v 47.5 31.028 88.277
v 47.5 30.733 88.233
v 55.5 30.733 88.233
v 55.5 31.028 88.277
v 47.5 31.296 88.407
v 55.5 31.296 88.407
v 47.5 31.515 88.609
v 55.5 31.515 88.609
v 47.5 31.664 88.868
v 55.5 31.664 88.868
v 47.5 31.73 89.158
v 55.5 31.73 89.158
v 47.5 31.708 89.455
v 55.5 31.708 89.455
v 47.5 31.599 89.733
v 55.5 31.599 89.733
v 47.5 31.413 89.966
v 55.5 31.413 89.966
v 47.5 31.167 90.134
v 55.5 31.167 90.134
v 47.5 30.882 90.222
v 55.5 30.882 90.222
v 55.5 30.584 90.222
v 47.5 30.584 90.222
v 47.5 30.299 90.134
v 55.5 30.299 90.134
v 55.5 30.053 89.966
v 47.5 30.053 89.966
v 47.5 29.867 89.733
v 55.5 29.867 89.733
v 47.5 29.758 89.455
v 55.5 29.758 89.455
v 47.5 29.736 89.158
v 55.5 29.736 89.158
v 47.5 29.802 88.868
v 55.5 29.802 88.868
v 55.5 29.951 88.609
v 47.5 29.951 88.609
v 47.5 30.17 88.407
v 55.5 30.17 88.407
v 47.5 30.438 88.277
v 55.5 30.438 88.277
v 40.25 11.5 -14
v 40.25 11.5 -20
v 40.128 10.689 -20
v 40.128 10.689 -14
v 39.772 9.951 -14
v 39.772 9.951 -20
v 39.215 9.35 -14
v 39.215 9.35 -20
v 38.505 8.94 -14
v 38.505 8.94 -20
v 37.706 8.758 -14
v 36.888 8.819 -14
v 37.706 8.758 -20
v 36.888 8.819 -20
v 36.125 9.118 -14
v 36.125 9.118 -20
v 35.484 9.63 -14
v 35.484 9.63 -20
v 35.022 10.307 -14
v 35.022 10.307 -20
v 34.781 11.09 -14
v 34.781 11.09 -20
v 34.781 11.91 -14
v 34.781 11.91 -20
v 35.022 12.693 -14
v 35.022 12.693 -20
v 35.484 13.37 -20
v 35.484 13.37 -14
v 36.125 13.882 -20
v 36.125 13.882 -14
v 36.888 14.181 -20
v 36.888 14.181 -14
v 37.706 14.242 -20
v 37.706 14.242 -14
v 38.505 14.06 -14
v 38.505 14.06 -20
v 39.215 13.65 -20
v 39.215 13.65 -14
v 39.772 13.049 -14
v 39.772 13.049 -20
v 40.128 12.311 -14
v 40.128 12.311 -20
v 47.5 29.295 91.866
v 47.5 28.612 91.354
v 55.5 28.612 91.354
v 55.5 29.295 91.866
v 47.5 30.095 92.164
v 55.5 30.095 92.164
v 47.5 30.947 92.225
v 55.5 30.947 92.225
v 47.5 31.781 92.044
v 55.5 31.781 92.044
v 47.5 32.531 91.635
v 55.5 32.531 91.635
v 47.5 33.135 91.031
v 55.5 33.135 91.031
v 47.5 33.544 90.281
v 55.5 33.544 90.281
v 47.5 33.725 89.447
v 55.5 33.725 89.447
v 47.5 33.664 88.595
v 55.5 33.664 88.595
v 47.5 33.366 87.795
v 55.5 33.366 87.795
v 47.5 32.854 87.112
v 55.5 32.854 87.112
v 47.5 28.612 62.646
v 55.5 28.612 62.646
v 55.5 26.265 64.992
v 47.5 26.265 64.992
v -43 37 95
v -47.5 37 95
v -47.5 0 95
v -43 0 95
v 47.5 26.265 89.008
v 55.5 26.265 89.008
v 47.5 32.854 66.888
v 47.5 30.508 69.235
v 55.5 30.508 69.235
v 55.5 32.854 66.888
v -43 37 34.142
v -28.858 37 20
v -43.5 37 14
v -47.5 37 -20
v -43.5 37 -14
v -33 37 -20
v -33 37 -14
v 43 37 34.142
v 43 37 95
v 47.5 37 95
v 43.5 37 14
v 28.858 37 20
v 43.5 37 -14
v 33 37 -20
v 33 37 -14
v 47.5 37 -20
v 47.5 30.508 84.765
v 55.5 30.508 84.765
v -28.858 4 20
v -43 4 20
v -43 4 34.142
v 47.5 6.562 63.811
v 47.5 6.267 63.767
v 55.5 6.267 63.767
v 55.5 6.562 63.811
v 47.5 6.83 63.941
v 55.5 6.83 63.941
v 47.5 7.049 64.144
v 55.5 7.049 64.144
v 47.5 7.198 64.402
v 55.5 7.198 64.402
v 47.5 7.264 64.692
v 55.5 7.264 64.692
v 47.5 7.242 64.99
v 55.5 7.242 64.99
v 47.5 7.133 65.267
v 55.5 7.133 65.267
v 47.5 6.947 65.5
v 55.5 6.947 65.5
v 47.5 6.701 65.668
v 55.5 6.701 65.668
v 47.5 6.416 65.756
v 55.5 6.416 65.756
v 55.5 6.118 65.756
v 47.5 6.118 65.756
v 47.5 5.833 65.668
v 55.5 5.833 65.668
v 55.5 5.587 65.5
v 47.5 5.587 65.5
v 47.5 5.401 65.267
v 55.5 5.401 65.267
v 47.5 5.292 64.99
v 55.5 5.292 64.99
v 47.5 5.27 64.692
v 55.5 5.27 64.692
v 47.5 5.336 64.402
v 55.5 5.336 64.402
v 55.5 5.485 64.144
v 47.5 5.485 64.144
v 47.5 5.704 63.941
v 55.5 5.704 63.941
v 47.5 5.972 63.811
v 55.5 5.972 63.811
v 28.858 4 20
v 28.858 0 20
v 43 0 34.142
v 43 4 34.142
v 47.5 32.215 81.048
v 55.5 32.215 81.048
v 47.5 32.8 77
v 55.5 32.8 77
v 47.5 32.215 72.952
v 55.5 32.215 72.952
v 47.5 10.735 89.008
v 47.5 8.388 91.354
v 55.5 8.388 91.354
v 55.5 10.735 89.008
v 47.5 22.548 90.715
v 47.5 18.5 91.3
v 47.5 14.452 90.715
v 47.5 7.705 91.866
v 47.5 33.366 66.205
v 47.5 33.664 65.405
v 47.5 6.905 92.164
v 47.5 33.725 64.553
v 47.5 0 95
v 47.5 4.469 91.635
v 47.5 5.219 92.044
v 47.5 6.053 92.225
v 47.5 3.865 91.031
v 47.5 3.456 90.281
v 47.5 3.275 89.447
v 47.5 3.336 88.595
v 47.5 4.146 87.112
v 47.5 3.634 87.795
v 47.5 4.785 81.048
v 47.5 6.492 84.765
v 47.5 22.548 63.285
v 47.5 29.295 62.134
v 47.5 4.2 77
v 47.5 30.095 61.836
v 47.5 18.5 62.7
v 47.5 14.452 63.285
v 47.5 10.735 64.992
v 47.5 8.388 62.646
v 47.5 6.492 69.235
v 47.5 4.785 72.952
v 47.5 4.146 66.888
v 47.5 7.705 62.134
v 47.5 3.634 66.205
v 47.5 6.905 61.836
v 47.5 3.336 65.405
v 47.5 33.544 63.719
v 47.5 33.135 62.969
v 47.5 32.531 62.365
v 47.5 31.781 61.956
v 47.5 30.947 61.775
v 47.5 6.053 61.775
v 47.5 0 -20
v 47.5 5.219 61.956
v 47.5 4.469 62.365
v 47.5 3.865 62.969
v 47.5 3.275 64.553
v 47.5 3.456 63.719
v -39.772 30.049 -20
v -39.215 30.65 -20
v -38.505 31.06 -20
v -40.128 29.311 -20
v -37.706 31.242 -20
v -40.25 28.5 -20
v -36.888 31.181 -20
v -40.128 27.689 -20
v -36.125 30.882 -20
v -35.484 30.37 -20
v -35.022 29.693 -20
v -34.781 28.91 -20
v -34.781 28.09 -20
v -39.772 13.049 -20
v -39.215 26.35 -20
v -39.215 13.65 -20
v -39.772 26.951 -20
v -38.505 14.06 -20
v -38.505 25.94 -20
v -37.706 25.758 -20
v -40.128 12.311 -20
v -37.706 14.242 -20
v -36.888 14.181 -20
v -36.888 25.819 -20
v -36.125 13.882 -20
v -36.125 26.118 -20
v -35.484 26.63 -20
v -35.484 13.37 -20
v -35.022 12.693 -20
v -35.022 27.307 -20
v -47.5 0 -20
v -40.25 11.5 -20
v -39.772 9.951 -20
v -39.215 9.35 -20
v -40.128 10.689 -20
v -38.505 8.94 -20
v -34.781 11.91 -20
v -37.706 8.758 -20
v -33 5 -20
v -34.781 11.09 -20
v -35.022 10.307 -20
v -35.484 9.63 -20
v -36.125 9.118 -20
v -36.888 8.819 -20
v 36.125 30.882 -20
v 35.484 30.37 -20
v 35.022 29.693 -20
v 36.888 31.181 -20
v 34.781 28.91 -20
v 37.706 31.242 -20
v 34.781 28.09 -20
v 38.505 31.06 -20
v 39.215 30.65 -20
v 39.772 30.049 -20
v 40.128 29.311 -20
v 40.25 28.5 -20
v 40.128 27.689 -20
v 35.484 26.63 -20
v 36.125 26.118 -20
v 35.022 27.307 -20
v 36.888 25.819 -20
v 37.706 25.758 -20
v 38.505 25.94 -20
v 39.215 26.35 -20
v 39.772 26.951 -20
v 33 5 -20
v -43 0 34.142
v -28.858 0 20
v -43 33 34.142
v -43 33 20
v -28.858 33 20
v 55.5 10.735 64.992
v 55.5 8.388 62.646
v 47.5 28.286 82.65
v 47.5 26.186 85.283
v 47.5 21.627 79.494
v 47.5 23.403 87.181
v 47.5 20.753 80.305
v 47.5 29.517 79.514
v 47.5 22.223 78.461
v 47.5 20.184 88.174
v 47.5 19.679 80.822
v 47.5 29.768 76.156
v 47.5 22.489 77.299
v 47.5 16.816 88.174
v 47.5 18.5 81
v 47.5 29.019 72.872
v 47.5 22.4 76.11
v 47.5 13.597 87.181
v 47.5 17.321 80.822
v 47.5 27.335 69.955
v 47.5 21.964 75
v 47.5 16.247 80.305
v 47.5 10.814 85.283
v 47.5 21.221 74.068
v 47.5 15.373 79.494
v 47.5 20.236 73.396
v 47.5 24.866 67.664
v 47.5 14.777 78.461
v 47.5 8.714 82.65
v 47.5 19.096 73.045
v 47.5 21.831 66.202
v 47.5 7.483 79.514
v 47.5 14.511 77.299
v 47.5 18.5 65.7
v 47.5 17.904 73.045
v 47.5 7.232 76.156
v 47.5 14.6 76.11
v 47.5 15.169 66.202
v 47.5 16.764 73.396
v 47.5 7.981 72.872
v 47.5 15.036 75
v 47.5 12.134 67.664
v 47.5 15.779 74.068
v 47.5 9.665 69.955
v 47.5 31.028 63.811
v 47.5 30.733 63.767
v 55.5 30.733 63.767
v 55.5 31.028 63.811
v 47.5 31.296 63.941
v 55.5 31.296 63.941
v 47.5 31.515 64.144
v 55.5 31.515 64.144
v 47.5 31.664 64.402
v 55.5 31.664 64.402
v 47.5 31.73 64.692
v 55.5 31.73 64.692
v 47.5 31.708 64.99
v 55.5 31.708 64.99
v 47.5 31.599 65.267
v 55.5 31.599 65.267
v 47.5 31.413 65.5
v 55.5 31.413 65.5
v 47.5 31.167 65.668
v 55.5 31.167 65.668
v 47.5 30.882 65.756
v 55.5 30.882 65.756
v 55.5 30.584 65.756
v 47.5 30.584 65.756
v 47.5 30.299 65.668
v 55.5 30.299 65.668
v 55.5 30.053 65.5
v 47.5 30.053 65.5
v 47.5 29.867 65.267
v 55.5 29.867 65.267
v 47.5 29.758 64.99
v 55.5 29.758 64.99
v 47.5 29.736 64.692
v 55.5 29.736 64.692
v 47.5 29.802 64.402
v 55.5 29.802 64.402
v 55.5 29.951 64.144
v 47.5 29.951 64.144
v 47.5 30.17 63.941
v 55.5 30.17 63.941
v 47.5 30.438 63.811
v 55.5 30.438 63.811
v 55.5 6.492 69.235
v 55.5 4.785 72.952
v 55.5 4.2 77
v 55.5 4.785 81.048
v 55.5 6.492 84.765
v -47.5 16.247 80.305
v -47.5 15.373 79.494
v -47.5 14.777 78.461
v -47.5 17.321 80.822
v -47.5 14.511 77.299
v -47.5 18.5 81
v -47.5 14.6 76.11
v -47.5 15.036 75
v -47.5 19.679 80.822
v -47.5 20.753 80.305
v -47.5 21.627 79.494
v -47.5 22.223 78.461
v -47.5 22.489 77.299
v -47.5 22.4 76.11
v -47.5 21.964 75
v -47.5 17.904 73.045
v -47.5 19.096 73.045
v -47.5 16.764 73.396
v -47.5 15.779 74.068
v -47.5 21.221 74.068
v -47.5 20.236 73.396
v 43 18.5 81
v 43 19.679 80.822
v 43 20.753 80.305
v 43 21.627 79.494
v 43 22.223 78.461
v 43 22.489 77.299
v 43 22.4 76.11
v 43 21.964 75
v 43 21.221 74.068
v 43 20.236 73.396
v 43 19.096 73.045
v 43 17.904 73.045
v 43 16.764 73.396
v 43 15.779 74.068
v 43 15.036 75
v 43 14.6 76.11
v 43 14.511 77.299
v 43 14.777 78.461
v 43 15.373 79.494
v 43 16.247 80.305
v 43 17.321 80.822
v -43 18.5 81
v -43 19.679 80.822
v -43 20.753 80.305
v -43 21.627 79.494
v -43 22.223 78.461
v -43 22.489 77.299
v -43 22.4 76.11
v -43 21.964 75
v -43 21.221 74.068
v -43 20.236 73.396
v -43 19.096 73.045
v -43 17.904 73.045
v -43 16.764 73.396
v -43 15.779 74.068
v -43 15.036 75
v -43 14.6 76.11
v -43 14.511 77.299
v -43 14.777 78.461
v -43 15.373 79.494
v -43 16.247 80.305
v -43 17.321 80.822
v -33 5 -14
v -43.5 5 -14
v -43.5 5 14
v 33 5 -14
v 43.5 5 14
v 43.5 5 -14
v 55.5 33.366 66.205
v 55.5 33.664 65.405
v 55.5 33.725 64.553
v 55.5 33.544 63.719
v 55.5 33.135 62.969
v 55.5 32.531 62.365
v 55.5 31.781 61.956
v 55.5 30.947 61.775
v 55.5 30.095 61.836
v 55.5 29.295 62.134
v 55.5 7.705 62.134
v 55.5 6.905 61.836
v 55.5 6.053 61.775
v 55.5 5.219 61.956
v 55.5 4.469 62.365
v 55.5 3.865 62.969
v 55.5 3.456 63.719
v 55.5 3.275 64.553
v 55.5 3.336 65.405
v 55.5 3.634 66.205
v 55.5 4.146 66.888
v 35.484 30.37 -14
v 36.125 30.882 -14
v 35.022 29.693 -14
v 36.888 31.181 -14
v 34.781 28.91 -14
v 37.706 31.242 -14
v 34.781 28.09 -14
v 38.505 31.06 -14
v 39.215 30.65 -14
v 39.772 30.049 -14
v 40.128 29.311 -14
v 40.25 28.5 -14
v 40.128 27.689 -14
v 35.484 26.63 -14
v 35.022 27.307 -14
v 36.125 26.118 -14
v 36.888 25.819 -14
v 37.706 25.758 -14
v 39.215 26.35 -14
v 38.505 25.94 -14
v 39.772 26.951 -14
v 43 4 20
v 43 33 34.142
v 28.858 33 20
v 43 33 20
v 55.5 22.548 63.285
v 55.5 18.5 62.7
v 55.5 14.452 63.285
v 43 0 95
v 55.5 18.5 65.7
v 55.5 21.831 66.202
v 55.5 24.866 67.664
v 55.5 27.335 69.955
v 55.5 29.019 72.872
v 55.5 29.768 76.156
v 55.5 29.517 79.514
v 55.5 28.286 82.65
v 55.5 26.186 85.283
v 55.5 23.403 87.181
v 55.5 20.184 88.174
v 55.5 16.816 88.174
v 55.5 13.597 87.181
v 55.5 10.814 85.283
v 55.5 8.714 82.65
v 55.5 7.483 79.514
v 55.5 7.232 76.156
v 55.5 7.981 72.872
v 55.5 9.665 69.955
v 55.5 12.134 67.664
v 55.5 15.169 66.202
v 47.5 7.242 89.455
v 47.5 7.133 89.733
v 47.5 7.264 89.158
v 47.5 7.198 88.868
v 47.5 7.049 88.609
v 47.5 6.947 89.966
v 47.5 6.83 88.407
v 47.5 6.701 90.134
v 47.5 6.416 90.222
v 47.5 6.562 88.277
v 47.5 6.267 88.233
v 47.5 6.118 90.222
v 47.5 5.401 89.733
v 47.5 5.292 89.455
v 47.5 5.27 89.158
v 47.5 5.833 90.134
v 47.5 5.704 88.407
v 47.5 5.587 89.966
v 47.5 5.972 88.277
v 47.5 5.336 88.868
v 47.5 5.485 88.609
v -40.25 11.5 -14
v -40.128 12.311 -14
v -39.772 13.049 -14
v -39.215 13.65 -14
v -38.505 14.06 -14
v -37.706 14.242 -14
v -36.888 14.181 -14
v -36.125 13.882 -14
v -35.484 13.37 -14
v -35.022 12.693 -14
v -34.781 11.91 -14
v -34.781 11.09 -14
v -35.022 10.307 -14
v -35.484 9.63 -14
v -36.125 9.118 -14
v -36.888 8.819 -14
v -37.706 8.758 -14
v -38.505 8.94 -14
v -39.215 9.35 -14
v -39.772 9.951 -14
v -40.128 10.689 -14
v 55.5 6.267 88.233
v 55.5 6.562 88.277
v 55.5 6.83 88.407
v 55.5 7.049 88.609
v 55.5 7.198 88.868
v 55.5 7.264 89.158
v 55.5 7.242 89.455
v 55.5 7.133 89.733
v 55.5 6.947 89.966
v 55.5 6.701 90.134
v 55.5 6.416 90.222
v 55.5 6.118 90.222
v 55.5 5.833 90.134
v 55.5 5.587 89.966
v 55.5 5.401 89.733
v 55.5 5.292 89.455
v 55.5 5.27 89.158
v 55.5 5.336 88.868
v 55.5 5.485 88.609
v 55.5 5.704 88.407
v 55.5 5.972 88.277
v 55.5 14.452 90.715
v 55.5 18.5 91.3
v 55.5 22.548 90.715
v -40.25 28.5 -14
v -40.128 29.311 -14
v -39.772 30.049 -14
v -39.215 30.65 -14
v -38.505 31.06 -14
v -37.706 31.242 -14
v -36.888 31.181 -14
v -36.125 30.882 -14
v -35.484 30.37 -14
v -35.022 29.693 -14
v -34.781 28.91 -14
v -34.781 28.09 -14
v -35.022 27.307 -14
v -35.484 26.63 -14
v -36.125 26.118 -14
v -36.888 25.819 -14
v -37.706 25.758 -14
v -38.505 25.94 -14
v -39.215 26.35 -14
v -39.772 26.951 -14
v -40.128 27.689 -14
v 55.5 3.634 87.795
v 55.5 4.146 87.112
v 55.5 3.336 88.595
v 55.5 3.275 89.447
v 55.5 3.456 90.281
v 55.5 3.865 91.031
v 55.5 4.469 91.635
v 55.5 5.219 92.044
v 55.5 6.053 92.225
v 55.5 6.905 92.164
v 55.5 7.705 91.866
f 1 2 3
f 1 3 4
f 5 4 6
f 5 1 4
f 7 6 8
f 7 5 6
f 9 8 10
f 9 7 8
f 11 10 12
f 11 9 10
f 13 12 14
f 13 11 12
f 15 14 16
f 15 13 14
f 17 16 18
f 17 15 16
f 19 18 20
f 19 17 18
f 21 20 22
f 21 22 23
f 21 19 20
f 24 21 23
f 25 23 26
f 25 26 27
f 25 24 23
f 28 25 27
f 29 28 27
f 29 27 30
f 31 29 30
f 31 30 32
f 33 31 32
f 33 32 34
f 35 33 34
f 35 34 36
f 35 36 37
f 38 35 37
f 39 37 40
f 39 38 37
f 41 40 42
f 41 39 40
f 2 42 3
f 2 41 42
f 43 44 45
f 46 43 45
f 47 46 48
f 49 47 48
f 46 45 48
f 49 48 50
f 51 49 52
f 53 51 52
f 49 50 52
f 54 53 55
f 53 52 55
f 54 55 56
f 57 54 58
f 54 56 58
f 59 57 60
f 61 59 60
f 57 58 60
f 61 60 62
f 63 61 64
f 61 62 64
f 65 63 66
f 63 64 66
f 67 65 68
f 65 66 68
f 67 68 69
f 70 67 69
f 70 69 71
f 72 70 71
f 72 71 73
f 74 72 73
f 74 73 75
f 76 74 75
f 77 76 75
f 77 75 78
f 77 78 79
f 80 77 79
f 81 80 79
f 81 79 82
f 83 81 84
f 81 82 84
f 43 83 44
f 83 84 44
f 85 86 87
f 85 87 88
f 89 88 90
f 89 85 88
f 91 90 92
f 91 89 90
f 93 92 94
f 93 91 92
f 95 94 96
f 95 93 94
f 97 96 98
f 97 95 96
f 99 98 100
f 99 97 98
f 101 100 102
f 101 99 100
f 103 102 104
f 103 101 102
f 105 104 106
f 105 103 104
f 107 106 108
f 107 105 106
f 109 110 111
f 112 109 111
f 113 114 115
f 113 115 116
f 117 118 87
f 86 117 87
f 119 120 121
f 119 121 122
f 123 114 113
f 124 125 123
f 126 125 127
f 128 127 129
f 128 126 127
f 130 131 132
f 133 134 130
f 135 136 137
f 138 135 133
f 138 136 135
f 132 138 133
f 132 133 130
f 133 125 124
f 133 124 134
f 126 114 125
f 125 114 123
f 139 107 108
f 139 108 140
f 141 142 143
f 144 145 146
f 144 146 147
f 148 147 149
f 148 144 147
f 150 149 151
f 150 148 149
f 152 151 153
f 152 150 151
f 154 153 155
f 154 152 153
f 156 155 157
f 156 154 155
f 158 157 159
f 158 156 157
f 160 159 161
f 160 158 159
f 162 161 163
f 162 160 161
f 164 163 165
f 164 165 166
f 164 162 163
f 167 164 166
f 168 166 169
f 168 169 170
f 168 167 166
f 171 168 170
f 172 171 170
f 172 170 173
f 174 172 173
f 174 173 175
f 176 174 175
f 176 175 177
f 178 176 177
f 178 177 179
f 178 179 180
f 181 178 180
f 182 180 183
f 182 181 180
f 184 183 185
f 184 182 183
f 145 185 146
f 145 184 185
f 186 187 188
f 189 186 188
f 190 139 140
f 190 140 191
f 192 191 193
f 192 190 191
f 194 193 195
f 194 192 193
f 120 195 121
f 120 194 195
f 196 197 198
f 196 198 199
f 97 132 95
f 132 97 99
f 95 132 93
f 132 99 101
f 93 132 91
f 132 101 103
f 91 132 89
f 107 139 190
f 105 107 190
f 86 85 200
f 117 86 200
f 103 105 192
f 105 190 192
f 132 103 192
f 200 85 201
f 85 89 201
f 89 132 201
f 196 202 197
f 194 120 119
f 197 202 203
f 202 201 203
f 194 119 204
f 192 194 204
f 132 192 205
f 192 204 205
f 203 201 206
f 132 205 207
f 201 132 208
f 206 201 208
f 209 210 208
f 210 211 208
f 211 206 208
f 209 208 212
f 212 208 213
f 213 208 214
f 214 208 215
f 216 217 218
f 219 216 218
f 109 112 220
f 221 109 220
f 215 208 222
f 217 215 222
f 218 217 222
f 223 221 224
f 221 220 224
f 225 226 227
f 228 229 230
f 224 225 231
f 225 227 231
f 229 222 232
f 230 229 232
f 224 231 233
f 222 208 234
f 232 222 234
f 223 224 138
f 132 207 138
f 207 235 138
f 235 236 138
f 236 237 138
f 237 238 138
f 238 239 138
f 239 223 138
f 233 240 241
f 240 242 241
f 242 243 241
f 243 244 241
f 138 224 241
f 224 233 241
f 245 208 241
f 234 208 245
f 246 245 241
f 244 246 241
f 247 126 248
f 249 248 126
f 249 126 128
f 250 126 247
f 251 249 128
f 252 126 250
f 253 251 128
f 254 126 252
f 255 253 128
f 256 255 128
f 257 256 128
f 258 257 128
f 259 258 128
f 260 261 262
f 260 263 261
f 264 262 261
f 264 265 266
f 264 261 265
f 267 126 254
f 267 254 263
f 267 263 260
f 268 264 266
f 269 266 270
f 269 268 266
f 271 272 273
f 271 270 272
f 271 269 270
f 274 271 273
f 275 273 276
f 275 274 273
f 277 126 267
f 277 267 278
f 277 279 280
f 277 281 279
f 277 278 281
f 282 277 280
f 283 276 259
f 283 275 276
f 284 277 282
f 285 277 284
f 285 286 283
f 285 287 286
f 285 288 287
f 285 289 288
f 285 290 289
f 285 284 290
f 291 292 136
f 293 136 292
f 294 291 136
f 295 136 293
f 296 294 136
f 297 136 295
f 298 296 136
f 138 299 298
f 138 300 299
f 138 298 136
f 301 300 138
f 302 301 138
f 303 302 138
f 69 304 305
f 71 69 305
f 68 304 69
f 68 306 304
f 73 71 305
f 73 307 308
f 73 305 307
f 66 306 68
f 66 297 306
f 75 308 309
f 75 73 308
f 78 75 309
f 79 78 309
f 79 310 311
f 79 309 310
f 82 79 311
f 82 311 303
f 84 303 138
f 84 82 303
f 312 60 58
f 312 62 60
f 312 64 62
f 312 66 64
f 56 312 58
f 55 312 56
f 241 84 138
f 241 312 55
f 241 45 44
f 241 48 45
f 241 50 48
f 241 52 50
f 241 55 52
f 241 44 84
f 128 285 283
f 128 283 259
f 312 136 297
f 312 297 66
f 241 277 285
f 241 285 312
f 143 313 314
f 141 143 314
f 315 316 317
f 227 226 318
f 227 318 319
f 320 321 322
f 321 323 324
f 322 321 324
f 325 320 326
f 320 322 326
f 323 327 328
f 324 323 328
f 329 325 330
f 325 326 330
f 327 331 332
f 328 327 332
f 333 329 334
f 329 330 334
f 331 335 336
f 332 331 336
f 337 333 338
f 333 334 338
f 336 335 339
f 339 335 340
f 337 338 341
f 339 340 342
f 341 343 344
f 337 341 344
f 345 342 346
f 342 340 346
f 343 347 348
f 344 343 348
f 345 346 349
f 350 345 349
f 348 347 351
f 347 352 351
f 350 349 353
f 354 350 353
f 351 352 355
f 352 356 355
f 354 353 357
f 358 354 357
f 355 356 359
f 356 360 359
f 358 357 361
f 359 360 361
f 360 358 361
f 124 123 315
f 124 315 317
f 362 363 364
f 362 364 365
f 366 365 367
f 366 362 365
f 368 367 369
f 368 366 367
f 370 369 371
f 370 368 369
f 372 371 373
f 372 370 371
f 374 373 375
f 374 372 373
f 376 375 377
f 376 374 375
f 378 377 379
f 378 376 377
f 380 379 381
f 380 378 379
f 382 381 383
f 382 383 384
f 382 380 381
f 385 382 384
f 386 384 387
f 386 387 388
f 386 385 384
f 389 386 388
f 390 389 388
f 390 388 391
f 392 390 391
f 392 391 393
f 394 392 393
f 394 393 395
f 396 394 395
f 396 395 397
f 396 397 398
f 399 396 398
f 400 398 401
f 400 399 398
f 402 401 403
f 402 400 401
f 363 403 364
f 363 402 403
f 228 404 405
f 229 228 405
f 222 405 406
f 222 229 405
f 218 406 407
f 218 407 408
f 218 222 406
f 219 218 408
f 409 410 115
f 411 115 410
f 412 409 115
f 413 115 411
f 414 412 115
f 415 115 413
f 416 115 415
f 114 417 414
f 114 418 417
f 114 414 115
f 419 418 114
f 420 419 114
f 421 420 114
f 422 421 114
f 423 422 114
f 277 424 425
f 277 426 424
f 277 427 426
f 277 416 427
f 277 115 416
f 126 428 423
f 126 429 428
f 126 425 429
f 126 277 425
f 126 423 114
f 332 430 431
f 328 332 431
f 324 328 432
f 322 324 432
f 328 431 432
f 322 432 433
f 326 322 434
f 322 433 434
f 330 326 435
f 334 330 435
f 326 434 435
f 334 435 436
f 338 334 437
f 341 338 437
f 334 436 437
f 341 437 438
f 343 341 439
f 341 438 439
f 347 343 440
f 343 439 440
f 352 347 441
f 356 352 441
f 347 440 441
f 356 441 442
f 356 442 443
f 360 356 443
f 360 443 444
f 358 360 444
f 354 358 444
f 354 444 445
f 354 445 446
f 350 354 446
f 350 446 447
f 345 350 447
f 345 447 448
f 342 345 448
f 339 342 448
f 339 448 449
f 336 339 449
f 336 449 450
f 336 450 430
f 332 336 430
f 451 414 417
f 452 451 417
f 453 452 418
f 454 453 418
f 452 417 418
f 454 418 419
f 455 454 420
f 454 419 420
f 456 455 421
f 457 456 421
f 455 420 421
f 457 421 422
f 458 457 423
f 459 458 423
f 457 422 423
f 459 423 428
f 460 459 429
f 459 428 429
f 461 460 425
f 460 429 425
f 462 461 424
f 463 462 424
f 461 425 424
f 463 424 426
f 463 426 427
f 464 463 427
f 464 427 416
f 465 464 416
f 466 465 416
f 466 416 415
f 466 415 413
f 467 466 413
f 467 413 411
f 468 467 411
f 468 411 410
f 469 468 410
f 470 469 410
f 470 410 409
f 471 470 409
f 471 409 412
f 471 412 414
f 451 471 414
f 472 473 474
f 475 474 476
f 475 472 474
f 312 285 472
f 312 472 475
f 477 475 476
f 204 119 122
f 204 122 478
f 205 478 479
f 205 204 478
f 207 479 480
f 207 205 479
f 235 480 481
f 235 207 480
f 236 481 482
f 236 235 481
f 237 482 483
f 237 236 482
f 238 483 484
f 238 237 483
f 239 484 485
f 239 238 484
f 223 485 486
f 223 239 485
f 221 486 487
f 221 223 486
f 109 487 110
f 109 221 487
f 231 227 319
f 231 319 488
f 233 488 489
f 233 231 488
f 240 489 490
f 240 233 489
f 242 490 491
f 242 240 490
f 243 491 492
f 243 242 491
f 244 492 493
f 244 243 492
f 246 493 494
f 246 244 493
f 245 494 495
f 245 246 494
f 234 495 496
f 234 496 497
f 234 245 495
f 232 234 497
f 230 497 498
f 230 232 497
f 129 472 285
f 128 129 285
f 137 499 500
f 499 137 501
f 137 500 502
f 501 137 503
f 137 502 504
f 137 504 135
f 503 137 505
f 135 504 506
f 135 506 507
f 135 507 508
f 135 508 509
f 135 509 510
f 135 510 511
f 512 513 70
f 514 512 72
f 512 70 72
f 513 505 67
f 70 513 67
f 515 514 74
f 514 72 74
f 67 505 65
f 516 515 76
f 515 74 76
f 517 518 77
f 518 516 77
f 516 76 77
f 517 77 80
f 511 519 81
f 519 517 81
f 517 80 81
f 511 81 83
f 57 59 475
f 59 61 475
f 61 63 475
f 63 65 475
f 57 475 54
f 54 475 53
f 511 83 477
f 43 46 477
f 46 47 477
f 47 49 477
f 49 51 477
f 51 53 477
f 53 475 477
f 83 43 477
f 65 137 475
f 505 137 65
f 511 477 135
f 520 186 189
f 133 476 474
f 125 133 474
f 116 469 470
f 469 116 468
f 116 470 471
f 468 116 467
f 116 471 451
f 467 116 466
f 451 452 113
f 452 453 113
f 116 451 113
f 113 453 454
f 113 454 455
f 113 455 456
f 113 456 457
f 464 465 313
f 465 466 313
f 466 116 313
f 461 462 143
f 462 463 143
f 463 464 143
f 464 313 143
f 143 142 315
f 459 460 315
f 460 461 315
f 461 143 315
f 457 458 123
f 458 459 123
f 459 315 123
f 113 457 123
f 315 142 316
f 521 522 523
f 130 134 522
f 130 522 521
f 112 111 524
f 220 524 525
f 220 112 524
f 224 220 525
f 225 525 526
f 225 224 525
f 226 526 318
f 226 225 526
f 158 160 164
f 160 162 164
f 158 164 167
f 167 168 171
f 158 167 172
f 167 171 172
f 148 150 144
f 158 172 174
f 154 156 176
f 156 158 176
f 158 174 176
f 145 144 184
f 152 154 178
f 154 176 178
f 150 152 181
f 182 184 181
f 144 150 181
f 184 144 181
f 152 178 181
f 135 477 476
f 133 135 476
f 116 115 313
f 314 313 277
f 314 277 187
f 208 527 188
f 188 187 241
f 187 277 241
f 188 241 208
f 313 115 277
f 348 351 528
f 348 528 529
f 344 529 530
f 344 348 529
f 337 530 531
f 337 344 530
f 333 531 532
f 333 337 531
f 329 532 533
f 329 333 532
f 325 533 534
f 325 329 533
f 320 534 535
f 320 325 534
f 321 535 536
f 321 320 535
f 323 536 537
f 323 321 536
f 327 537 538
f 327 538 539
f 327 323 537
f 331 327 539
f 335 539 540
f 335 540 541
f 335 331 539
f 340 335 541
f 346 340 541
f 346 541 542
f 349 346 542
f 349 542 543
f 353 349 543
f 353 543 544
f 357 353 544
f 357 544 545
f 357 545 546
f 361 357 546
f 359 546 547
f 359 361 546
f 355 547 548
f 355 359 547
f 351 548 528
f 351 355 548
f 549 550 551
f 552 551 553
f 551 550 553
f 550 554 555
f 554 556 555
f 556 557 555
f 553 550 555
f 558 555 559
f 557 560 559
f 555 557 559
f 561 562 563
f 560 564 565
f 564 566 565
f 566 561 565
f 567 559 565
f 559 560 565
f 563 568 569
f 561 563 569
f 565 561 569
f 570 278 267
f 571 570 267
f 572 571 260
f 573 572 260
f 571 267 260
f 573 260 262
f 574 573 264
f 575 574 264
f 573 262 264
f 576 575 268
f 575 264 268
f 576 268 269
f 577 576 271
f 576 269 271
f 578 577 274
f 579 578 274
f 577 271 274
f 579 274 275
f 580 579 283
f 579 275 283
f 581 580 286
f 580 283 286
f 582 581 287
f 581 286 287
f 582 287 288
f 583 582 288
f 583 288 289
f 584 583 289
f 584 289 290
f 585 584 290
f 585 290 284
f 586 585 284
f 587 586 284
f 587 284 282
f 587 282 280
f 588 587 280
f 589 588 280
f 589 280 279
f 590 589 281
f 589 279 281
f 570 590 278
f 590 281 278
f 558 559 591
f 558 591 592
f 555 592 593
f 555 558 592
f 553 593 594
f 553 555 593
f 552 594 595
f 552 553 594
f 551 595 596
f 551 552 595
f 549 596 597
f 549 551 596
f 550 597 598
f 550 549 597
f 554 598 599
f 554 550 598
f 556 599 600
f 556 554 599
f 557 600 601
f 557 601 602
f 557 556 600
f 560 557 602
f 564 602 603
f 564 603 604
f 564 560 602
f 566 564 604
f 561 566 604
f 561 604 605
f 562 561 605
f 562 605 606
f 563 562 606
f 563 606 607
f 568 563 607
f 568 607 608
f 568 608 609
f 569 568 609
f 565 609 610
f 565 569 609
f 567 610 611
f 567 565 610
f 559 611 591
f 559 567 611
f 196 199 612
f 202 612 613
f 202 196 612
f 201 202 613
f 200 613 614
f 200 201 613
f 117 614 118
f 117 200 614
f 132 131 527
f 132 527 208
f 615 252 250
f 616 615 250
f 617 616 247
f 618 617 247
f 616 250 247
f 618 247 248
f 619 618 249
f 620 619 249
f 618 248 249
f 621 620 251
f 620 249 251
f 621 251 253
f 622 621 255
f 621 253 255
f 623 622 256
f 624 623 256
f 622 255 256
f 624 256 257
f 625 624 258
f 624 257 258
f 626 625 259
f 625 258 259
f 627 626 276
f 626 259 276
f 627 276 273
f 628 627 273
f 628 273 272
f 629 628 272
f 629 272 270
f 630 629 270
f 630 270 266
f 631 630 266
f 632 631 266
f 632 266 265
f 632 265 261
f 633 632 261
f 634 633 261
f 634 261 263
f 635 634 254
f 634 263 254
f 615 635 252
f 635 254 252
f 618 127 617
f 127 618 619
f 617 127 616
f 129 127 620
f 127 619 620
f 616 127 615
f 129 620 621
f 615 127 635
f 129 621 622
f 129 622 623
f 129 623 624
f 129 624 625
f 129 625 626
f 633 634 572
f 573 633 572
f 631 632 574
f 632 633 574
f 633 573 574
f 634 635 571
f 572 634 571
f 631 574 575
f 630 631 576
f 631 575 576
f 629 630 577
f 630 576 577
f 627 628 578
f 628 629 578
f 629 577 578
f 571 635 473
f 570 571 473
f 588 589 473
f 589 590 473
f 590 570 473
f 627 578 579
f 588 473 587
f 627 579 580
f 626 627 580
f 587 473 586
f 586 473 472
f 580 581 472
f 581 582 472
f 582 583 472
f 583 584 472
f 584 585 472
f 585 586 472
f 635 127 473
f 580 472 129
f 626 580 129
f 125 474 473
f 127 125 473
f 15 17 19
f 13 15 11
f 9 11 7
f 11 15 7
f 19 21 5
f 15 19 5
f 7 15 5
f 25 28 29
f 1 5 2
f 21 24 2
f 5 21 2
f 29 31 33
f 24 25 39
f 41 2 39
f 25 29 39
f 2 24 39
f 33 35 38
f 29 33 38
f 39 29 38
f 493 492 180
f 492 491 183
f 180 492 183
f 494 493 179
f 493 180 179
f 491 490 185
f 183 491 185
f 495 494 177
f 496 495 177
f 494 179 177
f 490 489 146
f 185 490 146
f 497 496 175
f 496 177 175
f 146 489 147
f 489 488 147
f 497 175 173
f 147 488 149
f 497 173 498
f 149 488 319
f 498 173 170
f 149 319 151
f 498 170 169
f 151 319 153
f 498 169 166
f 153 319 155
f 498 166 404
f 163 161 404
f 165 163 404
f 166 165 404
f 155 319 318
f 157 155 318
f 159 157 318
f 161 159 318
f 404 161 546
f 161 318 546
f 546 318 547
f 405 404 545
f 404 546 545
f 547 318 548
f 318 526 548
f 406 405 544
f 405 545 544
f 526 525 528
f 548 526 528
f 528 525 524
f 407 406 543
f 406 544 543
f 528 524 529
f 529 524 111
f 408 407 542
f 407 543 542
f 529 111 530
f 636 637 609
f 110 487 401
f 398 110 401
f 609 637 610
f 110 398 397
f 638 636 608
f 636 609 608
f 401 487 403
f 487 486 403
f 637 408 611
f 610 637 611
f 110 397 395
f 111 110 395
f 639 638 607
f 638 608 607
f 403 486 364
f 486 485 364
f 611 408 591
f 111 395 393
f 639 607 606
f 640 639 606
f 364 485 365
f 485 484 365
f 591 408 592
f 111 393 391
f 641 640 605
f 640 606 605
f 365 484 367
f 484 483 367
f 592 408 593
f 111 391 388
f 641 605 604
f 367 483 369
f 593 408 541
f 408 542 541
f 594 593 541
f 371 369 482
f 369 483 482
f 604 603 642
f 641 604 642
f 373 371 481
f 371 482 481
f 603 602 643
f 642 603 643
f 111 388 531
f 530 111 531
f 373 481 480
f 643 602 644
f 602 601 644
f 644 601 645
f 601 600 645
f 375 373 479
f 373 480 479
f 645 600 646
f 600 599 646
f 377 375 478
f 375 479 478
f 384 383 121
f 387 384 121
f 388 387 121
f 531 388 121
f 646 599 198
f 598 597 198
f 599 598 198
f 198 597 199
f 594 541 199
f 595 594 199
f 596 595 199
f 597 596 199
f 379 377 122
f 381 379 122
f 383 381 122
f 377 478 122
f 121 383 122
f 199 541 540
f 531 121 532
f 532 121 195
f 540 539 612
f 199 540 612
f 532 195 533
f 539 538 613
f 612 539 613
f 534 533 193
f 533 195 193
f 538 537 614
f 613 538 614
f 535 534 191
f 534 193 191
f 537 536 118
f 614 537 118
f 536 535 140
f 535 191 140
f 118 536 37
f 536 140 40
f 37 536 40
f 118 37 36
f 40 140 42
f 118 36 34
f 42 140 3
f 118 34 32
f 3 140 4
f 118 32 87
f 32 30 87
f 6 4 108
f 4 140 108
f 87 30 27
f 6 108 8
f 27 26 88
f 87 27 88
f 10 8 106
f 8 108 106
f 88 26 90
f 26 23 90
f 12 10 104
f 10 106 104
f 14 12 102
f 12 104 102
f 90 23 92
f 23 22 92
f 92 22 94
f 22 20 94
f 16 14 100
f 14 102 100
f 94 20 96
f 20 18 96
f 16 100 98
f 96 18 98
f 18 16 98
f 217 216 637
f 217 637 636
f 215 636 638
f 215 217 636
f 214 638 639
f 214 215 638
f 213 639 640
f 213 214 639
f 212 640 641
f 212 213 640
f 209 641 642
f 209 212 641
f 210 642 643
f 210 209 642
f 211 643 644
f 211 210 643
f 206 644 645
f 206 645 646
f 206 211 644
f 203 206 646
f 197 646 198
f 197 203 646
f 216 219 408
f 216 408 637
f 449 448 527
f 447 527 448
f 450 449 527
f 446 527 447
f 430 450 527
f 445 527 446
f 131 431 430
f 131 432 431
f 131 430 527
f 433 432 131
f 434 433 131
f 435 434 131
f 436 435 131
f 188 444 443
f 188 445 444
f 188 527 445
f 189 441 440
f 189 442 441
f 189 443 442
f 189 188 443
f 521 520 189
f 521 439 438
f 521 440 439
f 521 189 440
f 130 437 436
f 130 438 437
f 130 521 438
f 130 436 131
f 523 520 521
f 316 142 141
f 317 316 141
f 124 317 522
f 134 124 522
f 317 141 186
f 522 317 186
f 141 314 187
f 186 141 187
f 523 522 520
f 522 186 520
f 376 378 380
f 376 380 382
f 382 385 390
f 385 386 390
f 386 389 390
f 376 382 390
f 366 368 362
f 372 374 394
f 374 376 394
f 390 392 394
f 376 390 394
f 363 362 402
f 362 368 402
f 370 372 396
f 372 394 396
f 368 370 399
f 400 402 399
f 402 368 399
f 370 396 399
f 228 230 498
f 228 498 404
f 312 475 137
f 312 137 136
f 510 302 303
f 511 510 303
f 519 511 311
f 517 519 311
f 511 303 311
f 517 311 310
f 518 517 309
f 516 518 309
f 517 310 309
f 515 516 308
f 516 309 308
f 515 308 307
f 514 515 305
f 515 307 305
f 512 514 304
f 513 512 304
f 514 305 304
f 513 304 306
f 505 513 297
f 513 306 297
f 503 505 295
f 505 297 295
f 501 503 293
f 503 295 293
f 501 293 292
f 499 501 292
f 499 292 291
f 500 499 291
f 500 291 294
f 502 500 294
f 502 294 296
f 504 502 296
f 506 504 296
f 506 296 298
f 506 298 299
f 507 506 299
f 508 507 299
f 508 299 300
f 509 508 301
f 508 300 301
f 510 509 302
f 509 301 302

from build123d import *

# Parameters (mm, degrees)
SKETCH1_W            = 95
SKETCH1_H            = 40
BOSS_EXTRUDE1_DEPTH  = 5
SKETCH2_W            = 14.5
SKETCH2_H            = 6
BOSS_EXTRUDE2_DEPTH  = 32
SKETCH4_R            = 2.75
CUT_EXTRUDE1_DEPTH   = 6
BOSS_EXTRUDE5_DEPTH  = 32
SKETCH11_W           = 4.5
SKETCH11_H           = 37
BOSS_EXTRUDE6_DEPTH  = 75
SKETCH12_R           = 4
CUT_EXTRUDE3_DEPTH   = 110
BOSS_EXTRUDE9_DEPTH  = 4
SKETCH16_R           = 11.3
SKETCH16_R_2         = 1
BOSS_EXTRUDE11_DEPTH = 8


with BuildPart() as part:
    # Sketch1 → Boss-Extrude1 (new body)
    with BuildSketch(Plane(origin=(0, 0, 0), x_dir=(1, 0, 0), z_dir=(0, 1, 0))):
        Rectangle(SKETCH1_W, SKETCH1_H)
    extrude(amount=BOSS_EXTRUDE1_DEPTH)

    # Sketch2 → Boss-Extrude2 (add)
    with BuildSketch(Plane(origin=(0, 5, 0), x_dir=(1, 0, 0), z_dir=(0, 1, 0))):
        with Locations((-40.25, 17)):
            Rectangle(SKETCH2_W, SKETCH2_H)
        with Locations((40.25, 17)):
            Rectangle(SKETCH2_W, SKETCH2_H)
    extrude(amount=BOSS_EXTRUDE2_DEPTH)

    # Sketch4 → Cut-Extrude1 (cut)
    with BuildSketch(Plane(origin=(0, 0, -20), x_dir=(-1, 0, 0), z_dir=(0, 0, -1))):
        with Locations((37.5, 11.5)):
            Circle(SKETCH4_R)
        with Locations((37.5, 28.5)):
            Circle(SKETCH4_R)
        with Locations(Location((-37.5, 28.5, 0), (0, 0, 180))):
            Circle(SKETCH4_R)
        with Locations(Location((-37.5, 11.5, 0), (0, 0, 180))):
            Circle(SKETCH4_R)
    extrude(amount=-CUT_EXTRUDE1_DEPTH, mode=Mode.SUBTRACT)

    # Sketch10 → Boss-Extrude5 (add)
    with BuildSketch(Plane(origin=(0, 5, 0), x_dir=(1, 0, 0), z_dir=(0, 1, 0))):
        Polygon((-47.5, -14), (-47.5, -20), (-43.5, -20), (43.5, -20), (47.5, -20), (47.5, -19), (47.5, 14), (43.5, 14), (43.5, -14), (-43.5, -14), (-43.5, 14), (-47.5, 14), align=None)
    extrude(amount=BOSS_EXTRUDE5_DEPTH)

    # Sketch11 → Boss-Extrude6 (add)
    with BuildSketch(Plane.XY.offset(20)):
        with Locations((-45.25, 18.5)):
            Rectangle(SKETCH11_W, SKETCH11_H)
        with Locations((45.25, 18.5)):
            Rectangle(SKETCH11_W, SKETCH11_H)
    extrude(amount=BOSS_EXTRUDE6_DEPTH)

    # Sketch12 → Cut-Extrude3 (cut)
    with BuildSketch(Plane.ZY.offset(47.5)):
        with Locations((77, 18.5)):
            Circle(SKETCH12_R)
    extrude(amount=-CUT_EXTRUDE3_DEPTH, mode=Mode.SUBTRACT)

    # Sketch15 → Boss-Extrude9 (add)
    with BuildSketch(Plane(origin=(0, 37, 0), x_dir=(1, 0, 0), z_dir=(0, 1, 0))):
        Polygon((28.857864376, -20), (43, -34.142135624), (43, -20), align=None)
        Polygon((-28.857864376, -20), (-43, -20), (-43, -34.142135624), align=None)
    boss_extrude9 = extrude(amount=-BOSS_EXTRUDE9_DEPTH)

    # Mirror2: Boss-Extrude9 across plane
    add(boss_extrude9.mirror(Plane.ZX.offset(18.5)))

    # Sketch16 → Boss-Extrude11 (add)
    with BuildSketch(Plane(origin=(47.5, 0, 0), x_dir=(0, 0, -1), z_dir=(1, 0, 0))):
        with BuildLine():
            Line((-66.888373029, 4.145732342), (-69.234713241, 6.492072554))
            ThreePointArc((-69.234713241, 6.492072554), (-77, 4.2), (-84.765286759, 6.492072554))
            Line((-84.765286759, 6.492072554), (-87.111626971, 4.145732342))
            ThreePointArc((-87.111626971, 4.145732342), (-91.354267658, 4.145732342), (-91.354267658, 8.388373029))
            Line((-91.354267658, 8.388373029), (-89.007927446, 10.734713241))
            ThreePointArc((-89.007927446, 10.734713241), (-91.3, 18.5), (-89.007927446, 26.265286759))
            Line((-89.007927446, 26.265286759), (-91.354267658, 28.611626971))
            ThreePointArc((-91.354267658, 28.611626971), (-91.354267658, 32.854267658), (-87.111626971, 32.854267658))
            Line((-87.111626971, 32.854267658), (-84.765286759, 30.507927446))
            ThreePointArc((-84.765286759, 30.507927446), (-77, 32.8), (-69.234713241, 30.507927446))
            Line((-69.234713241, 30.507927446), (-66.888373029, 32.854267658))
            ThreePointArc((-66.888373029, 32.854267658), (-62.645732342, 32.854267658), (-62.645732342, 28.611626971))
            Line((-62.645732342, 28.611626971), (-64.992072554, 26.265286759))
            ThreePointArc((-64.992072554, 26.265286759), (-62.7, 18.5), (-64.992072554, 10.734713241))
            Line((-64.992072554, 10.734713241), (-62.645732342, 8.388373029))
            ThreePointArc((-62.645732342, 8.388373029), (-62.645732342, 4.145732342), (-66.888373029, 4.145732342))
        make_face()
        with Locations((-77, 18.5)):
            Circle(SKETCH16_R, mode=Mode.SUBTRACT)
        with Locations((-64.767052685, 6.267052685)):
            Circle(SKETCH16_R_2, mode=Mode.SUBTRACT)
        with Locations((-89.232947315, 6.267052685)):
            Circle(SKETCH16_R_2, mode=Mode.SUBTRACT)
        with Locations((-89.232947315, 30.732947315)):
            Circle(SKETCH16_R_2, mode=Mode.SUBTRACT)
        with Locations((-64.767052685, 30.732947315)):
            Circle(SKETCH16_R_2, mode=Mode.SUBTRACT)
    extrude(amount=BOSS_EXTRUDE11_DEPTH)


solid = part.part
